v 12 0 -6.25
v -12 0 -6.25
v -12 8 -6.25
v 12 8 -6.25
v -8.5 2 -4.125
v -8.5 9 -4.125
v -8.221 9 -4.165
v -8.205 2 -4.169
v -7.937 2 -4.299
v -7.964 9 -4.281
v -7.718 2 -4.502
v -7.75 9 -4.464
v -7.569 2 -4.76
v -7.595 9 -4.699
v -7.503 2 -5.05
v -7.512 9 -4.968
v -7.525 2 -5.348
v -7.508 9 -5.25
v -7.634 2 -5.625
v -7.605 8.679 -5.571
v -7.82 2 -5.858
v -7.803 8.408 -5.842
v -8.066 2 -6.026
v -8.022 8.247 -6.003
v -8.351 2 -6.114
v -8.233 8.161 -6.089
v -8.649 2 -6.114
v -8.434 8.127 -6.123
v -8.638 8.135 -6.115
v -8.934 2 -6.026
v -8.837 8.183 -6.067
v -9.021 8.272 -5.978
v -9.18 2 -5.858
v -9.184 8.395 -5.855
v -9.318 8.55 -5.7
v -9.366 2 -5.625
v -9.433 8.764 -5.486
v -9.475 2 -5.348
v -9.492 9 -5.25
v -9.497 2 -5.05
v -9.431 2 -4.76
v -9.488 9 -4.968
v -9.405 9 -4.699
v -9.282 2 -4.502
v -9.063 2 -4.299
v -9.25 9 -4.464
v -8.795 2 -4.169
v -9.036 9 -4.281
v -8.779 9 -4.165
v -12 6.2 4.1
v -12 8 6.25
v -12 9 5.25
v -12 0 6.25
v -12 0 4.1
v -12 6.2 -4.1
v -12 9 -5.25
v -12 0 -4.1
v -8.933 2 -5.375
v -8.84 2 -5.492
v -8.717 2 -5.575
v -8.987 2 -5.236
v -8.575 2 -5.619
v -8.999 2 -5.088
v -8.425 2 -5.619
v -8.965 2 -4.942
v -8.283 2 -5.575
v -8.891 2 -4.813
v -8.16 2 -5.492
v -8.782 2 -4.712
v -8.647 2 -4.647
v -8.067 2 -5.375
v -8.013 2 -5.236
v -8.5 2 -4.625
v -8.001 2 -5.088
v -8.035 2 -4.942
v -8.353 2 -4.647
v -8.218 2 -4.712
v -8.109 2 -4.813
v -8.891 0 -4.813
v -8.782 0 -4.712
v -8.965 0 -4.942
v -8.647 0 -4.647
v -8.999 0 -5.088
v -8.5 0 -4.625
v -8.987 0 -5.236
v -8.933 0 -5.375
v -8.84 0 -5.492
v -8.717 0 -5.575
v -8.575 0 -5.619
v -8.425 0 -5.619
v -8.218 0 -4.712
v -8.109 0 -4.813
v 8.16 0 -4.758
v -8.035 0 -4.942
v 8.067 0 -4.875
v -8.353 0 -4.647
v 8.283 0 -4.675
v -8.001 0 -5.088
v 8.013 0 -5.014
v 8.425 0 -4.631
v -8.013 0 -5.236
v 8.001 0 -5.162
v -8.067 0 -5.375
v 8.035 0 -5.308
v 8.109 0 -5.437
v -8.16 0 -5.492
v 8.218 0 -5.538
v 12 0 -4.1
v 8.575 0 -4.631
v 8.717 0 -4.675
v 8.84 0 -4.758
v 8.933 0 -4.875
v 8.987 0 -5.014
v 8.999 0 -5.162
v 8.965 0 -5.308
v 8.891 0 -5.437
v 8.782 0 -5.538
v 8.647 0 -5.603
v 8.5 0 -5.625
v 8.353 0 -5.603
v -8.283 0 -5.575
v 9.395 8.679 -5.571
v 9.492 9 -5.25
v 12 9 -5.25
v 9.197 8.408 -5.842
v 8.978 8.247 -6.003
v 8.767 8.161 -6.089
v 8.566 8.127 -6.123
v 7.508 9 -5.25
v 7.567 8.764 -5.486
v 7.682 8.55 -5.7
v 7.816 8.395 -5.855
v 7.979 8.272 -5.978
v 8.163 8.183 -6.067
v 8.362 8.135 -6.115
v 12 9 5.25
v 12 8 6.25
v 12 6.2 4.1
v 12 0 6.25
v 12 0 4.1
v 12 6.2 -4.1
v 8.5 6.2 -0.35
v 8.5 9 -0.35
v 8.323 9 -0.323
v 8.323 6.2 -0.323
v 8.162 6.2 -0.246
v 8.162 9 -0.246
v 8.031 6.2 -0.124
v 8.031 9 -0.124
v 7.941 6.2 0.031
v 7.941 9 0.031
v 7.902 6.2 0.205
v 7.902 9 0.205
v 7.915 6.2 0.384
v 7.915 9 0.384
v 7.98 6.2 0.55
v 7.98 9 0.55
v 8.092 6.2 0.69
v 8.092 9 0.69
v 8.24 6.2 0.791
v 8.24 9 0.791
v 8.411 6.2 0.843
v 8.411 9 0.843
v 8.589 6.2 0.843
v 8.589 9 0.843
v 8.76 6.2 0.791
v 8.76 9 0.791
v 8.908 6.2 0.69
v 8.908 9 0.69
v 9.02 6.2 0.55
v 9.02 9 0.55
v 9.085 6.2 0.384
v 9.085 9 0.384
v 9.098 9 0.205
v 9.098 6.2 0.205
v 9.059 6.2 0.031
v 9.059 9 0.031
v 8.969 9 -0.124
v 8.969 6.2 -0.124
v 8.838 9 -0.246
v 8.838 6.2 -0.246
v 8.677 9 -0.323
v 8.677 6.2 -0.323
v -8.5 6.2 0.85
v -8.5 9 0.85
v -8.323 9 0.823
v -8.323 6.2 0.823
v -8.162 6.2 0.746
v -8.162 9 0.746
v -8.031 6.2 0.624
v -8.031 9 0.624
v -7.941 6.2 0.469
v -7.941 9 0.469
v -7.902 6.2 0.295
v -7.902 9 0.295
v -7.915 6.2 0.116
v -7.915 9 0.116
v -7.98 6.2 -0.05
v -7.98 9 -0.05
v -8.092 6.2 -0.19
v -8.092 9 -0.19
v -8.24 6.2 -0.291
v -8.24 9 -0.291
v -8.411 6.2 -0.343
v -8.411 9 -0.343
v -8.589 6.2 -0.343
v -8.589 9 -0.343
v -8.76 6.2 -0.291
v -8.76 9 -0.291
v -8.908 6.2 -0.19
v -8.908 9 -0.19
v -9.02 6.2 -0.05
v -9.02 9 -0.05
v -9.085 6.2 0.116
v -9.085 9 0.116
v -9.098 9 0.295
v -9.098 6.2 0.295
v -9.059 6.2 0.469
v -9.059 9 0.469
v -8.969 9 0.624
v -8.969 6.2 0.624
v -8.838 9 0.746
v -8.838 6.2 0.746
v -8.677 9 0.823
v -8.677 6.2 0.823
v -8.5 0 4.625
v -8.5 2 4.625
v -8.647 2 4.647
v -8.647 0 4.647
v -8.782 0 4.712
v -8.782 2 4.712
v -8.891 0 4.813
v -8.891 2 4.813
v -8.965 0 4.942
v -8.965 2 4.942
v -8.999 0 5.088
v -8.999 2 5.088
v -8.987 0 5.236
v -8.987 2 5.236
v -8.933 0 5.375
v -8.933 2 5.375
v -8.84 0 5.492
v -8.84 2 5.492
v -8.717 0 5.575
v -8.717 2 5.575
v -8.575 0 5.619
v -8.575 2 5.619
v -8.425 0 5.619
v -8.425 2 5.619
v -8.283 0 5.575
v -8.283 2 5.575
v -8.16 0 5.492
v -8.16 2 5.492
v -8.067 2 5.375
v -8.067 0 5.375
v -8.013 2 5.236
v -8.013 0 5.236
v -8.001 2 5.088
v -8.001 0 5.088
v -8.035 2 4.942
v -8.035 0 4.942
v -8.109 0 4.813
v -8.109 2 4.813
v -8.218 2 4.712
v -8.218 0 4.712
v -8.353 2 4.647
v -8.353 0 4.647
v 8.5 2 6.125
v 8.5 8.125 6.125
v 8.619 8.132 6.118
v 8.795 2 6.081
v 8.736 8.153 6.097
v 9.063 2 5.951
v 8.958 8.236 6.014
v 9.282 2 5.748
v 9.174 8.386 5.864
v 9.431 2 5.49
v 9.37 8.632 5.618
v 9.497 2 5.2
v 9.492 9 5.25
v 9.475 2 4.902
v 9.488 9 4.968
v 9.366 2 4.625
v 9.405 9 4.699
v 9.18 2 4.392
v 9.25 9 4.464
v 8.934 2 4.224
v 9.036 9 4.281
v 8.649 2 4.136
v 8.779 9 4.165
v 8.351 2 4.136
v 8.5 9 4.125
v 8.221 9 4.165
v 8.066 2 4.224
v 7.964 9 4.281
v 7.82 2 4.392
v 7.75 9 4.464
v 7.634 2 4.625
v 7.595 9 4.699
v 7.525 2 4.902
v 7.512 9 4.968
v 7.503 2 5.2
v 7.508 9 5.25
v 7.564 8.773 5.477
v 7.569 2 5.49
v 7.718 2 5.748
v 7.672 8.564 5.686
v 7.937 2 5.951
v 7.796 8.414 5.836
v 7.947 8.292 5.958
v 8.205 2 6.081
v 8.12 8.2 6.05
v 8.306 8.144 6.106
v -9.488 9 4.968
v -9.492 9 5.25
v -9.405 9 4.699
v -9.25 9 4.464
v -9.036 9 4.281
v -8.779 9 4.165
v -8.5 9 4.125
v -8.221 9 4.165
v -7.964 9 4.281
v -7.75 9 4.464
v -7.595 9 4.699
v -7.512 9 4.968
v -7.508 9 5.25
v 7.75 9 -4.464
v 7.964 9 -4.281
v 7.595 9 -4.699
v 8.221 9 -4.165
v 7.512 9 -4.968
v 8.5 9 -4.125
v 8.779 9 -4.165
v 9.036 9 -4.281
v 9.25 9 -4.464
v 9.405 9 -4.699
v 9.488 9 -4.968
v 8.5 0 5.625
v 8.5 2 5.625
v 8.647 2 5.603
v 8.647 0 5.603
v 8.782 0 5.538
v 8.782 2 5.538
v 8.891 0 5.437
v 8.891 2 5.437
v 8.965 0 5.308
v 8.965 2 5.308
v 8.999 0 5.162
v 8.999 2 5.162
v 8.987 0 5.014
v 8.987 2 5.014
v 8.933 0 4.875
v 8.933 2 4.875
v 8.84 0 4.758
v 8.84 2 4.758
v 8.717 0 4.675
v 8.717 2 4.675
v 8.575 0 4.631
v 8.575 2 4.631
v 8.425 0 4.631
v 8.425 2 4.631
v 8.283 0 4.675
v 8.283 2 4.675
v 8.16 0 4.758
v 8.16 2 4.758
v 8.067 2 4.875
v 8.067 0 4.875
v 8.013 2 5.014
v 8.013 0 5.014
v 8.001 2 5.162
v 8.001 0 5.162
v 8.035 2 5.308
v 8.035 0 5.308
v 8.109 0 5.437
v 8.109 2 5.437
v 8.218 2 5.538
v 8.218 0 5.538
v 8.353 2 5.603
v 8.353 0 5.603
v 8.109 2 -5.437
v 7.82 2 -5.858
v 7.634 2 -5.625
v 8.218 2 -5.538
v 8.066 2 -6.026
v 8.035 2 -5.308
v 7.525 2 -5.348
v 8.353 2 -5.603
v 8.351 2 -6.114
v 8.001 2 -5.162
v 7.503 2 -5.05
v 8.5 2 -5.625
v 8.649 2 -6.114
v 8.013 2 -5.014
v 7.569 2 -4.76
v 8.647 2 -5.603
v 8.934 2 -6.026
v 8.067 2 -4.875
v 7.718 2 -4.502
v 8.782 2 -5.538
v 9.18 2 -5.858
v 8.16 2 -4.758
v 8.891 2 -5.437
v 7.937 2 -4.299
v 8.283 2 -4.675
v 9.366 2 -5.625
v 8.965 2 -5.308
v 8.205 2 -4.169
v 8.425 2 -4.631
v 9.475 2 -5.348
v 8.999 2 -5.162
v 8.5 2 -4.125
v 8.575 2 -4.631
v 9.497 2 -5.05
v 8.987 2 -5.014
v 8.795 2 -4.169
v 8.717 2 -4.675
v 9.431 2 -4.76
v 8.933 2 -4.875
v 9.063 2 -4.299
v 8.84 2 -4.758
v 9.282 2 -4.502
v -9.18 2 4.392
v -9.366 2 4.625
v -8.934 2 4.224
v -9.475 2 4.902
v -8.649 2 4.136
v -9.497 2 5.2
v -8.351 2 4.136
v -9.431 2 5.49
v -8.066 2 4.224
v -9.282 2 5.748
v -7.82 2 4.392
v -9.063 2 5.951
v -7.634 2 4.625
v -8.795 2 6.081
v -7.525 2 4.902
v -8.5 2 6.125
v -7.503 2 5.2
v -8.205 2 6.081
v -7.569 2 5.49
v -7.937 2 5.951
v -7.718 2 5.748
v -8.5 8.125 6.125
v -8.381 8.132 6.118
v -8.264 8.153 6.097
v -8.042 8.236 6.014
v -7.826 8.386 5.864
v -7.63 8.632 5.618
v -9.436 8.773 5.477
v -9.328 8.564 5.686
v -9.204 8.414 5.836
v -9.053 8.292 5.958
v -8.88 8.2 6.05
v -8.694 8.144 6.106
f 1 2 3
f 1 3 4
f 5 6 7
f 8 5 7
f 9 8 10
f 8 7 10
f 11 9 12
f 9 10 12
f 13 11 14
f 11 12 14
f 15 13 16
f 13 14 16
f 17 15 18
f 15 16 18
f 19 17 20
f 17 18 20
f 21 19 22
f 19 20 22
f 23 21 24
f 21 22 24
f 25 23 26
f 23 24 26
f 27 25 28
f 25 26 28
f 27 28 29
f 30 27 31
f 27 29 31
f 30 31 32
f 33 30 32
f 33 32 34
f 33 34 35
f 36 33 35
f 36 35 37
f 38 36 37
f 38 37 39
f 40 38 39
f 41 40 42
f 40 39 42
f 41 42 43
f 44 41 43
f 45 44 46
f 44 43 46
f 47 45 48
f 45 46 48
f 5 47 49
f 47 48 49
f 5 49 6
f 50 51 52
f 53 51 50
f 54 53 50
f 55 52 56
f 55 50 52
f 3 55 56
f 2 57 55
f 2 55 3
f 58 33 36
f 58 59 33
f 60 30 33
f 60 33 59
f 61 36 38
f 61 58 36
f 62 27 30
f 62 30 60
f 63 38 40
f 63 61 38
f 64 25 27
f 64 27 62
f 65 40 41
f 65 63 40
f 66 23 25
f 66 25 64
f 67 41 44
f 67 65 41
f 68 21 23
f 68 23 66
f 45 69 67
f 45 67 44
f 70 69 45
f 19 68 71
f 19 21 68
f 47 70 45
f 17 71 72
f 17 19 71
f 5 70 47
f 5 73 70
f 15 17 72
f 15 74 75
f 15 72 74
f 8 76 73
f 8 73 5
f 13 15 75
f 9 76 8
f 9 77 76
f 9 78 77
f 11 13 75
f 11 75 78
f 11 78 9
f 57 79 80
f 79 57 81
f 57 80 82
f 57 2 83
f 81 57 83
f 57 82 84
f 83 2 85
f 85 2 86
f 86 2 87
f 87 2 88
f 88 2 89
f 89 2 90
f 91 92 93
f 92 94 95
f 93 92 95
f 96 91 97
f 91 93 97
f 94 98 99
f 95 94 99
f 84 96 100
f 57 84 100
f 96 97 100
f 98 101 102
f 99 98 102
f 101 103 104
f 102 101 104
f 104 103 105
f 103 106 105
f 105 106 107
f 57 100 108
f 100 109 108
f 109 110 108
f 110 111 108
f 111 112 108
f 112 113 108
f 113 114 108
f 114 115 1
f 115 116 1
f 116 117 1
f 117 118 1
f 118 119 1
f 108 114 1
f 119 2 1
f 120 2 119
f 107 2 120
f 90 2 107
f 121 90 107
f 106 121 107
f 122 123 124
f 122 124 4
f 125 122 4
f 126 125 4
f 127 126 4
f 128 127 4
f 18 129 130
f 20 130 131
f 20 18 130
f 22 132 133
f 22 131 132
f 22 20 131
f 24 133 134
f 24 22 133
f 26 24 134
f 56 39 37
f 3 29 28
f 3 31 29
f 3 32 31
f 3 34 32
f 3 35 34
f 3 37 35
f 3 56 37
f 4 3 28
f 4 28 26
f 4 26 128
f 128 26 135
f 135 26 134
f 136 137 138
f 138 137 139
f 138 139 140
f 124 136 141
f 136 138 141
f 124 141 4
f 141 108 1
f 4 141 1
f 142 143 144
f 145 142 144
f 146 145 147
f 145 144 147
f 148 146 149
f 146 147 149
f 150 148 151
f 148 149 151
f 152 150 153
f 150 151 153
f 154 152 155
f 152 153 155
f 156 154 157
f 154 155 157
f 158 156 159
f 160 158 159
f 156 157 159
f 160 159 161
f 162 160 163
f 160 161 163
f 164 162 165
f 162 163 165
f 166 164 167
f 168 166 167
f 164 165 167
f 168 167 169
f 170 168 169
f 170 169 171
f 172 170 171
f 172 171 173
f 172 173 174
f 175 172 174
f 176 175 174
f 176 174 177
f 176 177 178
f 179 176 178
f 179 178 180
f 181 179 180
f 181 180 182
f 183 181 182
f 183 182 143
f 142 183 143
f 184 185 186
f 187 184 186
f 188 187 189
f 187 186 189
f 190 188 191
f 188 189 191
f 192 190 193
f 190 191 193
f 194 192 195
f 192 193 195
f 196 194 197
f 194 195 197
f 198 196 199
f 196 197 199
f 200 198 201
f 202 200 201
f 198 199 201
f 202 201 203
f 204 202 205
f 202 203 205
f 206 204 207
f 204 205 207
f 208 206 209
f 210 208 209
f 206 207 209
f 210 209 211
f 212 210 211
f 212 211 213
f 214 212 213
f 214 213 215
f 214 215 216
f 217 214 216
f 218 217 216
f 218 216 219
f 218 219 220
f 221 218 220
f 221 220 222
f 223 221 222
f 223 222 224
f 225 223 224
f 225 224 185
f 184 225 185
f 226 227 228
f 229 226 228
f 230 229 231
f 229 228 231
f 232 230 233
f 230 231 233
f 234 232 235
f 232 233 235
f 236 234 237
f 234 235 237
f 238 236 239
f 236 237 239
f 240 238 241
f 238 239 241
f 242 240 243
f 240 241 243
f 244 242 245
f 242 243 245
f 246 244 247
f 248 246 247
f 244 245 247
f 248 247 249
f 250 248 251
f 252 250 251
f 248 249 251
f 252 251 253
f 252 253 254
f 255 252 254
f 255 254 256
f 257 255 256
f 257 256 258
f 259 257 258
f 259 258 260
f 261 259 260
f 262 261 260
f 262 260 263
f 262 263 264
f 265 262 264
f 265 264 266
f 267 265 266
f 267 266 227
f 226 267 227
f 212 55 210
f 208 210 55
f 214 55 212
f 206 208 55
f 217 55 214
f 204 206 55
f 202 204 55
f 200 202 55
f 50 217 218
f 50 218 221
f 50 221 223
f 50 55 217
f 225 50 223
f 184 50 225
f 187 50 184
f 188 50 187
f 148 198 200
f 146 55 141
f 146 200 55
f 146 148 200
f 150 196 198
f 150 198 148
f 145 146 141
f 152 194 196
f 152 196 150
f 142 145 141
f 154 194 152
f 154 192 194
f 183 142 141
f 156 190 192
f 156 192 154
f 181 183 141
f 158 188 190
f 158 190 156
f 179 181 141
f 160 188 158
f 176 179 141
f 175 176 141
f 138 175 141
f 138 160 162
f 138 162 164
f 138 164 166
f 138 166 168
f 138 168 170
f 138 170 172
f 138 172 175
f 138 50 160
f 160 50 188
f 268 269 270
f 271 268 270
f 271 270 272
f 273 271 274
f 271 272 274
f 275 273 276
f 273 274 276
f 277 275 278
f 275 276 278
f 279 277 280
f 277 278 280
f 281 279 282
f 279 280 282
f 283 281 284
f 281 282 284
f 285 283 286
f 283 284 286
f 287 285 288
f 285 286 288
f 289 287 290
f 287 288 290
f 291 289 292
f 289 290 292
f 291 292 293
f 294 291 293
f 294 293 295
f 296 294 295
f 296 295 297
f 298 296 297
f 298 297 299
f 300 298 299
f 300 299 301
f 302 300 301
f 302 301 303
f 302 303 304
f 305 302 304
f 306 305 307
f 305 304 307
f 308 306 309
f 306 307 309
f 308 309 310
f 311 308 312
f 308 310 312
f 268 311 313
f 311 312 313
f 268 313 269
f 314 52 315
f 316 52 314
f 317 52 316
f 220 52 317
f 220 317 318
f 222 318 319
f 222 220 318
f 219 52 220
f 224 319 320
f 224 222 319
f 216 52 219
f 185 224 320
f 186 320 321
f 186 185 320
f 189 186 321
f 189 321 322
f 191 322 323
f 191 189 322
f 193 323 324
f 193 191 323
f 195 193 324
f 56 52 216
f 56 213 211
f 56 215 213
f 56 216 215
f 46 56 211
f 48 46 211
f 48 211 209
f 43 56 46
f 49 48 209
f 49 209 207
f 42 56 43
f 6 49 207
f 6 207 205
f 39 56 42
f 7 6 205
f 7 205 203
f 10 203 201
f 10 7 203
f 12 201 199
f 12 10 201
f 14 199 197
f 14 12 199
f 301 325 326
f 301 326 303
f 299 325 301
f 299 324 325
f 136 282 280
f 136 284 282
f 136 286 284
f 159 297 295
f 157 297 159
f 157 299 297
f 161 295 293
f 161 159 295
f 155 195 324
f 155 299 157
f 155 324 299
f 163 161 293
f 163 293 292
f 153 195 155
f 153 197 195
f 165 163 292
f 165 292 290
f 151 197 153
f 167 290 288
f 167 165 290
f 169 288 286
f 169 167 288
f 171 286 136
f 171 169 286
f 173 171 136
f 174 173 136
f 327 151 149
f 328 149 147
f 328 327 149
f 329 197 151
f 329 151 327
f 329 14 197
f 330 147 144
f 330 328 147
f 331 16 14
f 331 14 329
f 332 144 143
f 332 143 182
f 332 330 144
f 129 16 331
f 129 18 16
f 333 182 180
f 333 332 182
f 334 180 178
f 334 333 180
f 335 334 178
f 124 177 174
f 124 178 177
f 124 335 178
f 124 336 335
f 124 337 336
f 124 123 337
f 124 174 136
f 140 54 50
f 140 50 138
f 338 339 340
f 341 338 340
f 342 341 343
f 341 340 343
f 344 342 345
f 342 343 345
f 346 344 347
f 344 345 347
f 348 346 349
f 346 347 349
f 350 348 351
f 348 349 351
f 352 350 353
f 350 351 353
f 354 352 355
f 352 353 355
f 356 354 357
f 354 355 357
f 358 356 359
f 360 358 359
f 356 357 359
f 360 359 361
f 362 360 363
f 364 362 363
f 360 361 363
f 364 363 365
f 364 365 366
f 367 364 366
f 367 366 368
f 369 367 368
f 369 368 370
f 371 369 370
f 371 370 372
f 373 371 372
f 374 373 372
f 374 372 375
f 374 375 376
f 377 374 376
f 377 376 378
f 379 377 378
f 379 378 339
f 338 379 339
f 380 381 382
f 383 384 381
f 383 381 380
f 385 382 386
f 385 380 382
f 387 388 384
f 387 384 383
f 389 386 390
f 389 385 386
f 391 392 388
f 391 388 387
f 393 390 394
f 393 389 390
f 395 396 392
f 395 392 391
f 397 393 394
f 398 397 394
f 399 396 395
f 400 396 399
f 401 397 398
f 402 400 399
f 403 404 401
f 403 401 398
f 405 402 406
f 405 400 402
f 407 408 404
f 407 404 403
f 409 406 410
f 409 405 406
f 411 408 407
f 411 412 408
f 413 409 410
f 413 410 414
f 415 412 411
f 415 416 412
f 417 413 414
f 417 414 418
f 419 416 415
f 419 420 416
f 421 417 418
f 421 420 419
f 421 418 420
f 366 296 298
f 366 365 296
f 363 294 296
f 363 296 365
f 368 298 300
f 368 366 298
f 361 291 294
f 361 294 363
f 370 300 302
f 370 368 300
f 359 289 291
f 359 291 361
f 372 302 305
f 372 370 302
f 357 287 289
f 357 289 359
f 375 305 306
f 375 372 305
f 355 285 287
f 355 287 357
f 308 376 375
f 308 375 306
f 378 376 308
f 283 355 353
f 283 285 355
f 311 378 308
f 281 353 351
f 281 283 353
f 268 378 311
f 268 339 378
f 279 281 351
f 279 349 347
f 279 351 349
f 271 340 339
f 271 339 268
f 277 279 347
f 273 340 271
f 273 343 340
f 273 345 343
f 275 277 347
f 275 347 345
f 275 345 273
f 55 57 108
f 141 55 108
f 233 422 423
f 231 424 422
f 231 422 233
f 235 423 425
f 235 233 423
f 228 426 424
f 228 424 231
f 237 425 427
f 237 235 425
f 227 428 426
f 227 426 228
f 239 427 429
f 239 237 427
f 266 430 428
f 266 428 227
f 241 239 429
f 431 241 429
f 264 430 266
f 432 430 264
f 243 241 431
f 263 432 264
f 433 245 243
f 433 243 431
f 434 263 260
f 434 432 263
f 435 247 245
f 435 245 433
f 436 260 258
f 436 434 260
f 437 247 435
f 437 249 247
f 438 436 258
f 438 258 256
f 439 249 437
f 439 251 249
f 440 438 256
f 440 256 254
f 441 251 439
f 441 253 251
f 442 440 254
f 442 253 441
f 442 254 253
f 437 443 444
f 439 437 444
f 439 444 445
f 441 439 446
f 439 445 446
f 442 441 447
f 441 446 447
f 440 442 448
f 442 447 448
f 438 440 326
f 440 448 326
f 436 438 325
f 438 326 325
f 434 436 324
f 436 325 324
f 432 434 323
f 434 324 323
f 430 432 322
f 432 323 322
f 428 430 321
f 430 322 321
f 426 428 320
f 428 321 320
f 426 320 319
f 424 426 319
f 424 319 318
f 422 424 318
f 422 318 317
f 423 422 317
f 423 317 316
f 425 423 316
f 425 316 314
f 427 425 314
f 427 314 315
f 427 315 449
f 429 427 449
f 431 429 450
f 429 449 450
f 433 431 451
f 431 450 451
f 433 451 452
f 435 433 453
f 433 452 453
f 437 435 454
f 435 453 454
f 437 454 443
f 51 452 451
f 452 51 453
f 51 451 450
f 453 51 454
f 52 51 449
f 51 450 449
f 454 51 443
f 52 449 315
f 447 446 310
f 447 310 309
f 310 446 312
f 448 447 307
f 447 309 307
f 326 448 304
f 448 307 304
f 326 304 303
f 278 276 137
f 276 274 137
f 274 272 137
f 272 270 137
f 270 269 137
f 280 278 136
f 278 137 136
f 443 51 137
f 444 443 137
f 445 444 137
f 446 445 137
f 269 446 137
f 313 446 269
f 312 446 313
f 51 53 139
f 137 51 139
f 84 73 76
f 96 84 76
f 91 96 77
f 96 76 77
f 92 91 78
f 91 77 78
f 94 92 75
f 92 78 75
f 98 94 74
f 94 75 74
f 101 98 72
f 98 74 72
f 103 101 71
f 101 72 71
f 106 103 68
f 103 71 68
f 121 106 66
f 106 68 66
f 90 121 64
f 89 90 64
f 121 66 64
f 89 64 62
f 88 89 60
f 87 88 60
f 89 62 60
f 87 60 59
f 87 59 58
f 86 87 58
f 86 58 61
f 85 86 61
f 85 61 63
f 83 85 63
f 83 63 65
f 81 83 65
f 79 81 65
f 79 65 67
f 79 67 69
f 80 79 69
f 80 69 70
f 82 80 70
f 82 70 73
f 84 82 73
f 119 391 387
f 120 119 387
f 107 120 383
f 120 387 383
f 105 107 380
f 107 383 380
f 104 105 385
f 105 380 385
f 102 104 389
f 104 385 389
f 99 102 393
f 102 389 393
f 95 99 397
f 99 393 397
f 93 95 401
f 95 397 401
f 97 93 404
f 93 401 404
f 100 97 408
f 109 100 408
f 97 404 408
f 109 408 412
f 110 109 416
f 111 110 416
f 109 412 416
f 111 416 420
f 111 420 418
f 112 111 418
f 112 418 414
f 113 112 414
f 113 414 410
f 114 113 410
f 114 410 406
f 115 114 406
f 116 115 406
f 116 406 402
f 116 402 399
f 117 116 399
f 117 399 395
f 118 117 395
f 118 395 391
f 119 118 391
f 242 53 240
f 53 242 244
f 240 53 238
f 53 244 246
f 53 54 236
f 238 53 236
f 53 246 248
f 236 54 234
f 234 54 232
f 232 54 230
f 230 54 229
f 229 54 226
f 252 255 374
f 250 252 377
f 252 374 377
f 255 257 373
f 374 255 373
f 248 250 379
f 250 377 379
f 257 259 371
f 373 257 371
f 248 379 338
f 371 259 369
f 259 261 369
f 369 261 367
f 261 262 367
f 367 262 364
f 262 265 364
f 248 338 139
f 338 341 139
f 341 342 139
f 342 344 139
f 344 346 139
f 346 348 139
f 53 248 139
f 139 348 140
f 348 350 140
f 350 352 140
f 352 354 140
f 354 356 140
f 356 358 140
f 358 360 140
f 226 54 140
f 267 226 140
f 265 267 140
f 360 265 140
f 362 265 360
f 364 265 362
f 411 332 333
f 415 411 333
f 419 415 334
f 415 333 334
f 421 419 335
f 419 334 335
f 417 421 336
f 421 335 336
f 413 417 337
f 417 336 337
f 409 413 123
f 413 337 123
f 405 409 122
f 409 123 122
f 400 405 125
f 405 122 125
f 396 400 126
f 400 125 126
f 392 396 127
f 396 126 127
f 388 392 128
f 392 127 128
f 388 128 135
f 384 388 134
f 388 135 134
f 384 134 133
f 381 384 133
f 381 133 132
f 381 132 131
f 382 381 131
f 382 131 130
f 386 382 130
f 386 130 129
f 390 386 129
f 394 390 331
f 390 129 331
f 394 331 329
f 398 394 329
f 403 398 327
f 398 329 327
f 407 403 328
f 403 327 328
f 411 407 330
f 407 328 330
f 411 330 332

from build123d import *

# Parameters (mm, degrees)
SKETCH_1_W          = 24
SKETCH_1_H          = 12.5
EXTRUDE_1_DEPTH     = 9
SKETCH_2_W          = 24
SKETCH_2_H          = 8.2
CUT_EXTRUDE_1_DEPTH = 6.2
SKETCH_3_R          = 0.5
CUT_EXTRUDE_2_DEPTH = 17.25
SKETCH_4_R          = 0.6
CUT_EXTRUDE_3_DEPTH = 17.25
SKETCH_5_R          = 1
CUT_EXTRUDE_4_DEPTH = 7
CHAMFER_1_SIZE      = 1


with BuildPart() as part:
    # 草图1 → 凸台-拉伸1 (new body)
    with BuildSketch(Plane(origin=(0, 0, 0), x_dir=(1, 0, 0), z_dir=(0, 1, 0))):
        Rectangle(SKETCH_1_W, SKETCH_1_H)
    extrude(amount=EXTRUDE_1_DEPTH)

    # 草图2 → 切除-拉伸1 (cut)
    with BuildSketch(Plane.XZ):
        Rectangle(SKETCH_2_W, SKETCH_2_H)
    extrude(amount=-CUT_EXTRUDE_1_DEPTH, mode=Mode.SUBTRACT)

    # 草图3 → 切除-拉伸2 (cut, through all)
    with BuildSketch(Plane(origin=(0, 9, 0), x_dir=(1, 0, 0), z_dir=(0, 1, 0))):
        with Locations(Location((-8.5, 5.125, 0), (0, 0, 270))):
            Circle(SKETCH_3_R)
        with Locations(Location((8.5, 5.125, 0), (0, 0, 90))):
            Circle(SKETCH_3_R)
        with Locations(Location((8.5, -5.125, 0), (0, 0, 270))):
            Circle(SKETCH_3_R)
        with Locations(Location((-8.5, -5.125, 0), (0, 0, 90))):
            Circle(SKETCH_3_R)
    extrude(amount=-CUT_EXTRUDE_2_DEPTH, mode=Mode.SUBTRACT)

    # 草图4 → 切除-拉伸3 (cut, through all)
    with BuildSketch(Plane(origin=(0, 9, 0), x_dir=(1, 0, 0), z_dir=(0, 1, 0))):
        with Locations(Location((-8.5, -0.25, 0), (0, 0, 270))):
            Circle(SKETCH_4_R)
        with Locations(Location((8.5, -0.25, 0), (0, 0, 90))):
            Circle(SKETCH_4_R)
    extrude(amount=-CUT_EXTRUDE_3_DEPTH, mode=Mode.SUBTRACT)

    # 草图5 → 切除-拉伸4 (cut)
    with BuildSketch(Plane(origin=(0, 9, 0), x_dir=(1, 0, 0), z_dir=(0, 1, 0))):
        with Locations(Location((-8.5, 5.125, 0), (0, 0, 270))):
            Circle(SKETCH_5_R)
        with Locations(Location((8.5, 5.125, 0), (0, 0, 270))):
            Circle(SKETCH_5_R)
        with Locations(Location((-8.5, -5.125, 0), (0, 0, 270))):
            Circle(SKETCH_5_R)
        with Locations(Location((8.5, -5.125, 0), (0, 0, 270))):
            Circle(SKETCH_5_R)
    extrude(amount=-CUT_EXTRUDE_4_DEPTH, mode=Mode.SUBTRACT)

    # 倒角1
    # the kernel refuses this chamfer: 1 mm, written as the material it takes off along each edge
    with BuildSketch(Plane(origin=(-14.571682988, 9, -6.25), x_dir=(0, 0.027495876610585623, 0.9996219169112968), z_dir=(1, 0, 0))) as chamfer_1_piece_1:
        Polygon((CHAMFER_1_SIZE * 0.999621916911, CHAMFER_1_SIZE * 0.0274958766106), (-CHAMFER_1_SIZE * 0.0274958766106, CHAMFER_1_SIZE * 0.999621916911), (0, 0), align=None)
    extrude(amount=29.143365976, mode=Mode.SUBTRACT)
    with BuildSketch(Plane(origin=(14.571682988, 9, 6.25), x_dir=(0, -0.9996219169112968, 0.027495876610586487), z_dir=(-1, 0, 0))) as chamfer_1_piece_2:
        Polygon((CHAMFER_1_SIZE * 0.999621916911, -CHAMFER_1_SIZE * 0.0274958766106), (-CHAMFER_1_SIZE * 0.0274958766106, -CHAMFER_1_SIZE * 0.999621916911), (0, 0), align=None)
    extrude(amount=29.143365976, mode=Mode.SUBTRACT)


solid = part.part
